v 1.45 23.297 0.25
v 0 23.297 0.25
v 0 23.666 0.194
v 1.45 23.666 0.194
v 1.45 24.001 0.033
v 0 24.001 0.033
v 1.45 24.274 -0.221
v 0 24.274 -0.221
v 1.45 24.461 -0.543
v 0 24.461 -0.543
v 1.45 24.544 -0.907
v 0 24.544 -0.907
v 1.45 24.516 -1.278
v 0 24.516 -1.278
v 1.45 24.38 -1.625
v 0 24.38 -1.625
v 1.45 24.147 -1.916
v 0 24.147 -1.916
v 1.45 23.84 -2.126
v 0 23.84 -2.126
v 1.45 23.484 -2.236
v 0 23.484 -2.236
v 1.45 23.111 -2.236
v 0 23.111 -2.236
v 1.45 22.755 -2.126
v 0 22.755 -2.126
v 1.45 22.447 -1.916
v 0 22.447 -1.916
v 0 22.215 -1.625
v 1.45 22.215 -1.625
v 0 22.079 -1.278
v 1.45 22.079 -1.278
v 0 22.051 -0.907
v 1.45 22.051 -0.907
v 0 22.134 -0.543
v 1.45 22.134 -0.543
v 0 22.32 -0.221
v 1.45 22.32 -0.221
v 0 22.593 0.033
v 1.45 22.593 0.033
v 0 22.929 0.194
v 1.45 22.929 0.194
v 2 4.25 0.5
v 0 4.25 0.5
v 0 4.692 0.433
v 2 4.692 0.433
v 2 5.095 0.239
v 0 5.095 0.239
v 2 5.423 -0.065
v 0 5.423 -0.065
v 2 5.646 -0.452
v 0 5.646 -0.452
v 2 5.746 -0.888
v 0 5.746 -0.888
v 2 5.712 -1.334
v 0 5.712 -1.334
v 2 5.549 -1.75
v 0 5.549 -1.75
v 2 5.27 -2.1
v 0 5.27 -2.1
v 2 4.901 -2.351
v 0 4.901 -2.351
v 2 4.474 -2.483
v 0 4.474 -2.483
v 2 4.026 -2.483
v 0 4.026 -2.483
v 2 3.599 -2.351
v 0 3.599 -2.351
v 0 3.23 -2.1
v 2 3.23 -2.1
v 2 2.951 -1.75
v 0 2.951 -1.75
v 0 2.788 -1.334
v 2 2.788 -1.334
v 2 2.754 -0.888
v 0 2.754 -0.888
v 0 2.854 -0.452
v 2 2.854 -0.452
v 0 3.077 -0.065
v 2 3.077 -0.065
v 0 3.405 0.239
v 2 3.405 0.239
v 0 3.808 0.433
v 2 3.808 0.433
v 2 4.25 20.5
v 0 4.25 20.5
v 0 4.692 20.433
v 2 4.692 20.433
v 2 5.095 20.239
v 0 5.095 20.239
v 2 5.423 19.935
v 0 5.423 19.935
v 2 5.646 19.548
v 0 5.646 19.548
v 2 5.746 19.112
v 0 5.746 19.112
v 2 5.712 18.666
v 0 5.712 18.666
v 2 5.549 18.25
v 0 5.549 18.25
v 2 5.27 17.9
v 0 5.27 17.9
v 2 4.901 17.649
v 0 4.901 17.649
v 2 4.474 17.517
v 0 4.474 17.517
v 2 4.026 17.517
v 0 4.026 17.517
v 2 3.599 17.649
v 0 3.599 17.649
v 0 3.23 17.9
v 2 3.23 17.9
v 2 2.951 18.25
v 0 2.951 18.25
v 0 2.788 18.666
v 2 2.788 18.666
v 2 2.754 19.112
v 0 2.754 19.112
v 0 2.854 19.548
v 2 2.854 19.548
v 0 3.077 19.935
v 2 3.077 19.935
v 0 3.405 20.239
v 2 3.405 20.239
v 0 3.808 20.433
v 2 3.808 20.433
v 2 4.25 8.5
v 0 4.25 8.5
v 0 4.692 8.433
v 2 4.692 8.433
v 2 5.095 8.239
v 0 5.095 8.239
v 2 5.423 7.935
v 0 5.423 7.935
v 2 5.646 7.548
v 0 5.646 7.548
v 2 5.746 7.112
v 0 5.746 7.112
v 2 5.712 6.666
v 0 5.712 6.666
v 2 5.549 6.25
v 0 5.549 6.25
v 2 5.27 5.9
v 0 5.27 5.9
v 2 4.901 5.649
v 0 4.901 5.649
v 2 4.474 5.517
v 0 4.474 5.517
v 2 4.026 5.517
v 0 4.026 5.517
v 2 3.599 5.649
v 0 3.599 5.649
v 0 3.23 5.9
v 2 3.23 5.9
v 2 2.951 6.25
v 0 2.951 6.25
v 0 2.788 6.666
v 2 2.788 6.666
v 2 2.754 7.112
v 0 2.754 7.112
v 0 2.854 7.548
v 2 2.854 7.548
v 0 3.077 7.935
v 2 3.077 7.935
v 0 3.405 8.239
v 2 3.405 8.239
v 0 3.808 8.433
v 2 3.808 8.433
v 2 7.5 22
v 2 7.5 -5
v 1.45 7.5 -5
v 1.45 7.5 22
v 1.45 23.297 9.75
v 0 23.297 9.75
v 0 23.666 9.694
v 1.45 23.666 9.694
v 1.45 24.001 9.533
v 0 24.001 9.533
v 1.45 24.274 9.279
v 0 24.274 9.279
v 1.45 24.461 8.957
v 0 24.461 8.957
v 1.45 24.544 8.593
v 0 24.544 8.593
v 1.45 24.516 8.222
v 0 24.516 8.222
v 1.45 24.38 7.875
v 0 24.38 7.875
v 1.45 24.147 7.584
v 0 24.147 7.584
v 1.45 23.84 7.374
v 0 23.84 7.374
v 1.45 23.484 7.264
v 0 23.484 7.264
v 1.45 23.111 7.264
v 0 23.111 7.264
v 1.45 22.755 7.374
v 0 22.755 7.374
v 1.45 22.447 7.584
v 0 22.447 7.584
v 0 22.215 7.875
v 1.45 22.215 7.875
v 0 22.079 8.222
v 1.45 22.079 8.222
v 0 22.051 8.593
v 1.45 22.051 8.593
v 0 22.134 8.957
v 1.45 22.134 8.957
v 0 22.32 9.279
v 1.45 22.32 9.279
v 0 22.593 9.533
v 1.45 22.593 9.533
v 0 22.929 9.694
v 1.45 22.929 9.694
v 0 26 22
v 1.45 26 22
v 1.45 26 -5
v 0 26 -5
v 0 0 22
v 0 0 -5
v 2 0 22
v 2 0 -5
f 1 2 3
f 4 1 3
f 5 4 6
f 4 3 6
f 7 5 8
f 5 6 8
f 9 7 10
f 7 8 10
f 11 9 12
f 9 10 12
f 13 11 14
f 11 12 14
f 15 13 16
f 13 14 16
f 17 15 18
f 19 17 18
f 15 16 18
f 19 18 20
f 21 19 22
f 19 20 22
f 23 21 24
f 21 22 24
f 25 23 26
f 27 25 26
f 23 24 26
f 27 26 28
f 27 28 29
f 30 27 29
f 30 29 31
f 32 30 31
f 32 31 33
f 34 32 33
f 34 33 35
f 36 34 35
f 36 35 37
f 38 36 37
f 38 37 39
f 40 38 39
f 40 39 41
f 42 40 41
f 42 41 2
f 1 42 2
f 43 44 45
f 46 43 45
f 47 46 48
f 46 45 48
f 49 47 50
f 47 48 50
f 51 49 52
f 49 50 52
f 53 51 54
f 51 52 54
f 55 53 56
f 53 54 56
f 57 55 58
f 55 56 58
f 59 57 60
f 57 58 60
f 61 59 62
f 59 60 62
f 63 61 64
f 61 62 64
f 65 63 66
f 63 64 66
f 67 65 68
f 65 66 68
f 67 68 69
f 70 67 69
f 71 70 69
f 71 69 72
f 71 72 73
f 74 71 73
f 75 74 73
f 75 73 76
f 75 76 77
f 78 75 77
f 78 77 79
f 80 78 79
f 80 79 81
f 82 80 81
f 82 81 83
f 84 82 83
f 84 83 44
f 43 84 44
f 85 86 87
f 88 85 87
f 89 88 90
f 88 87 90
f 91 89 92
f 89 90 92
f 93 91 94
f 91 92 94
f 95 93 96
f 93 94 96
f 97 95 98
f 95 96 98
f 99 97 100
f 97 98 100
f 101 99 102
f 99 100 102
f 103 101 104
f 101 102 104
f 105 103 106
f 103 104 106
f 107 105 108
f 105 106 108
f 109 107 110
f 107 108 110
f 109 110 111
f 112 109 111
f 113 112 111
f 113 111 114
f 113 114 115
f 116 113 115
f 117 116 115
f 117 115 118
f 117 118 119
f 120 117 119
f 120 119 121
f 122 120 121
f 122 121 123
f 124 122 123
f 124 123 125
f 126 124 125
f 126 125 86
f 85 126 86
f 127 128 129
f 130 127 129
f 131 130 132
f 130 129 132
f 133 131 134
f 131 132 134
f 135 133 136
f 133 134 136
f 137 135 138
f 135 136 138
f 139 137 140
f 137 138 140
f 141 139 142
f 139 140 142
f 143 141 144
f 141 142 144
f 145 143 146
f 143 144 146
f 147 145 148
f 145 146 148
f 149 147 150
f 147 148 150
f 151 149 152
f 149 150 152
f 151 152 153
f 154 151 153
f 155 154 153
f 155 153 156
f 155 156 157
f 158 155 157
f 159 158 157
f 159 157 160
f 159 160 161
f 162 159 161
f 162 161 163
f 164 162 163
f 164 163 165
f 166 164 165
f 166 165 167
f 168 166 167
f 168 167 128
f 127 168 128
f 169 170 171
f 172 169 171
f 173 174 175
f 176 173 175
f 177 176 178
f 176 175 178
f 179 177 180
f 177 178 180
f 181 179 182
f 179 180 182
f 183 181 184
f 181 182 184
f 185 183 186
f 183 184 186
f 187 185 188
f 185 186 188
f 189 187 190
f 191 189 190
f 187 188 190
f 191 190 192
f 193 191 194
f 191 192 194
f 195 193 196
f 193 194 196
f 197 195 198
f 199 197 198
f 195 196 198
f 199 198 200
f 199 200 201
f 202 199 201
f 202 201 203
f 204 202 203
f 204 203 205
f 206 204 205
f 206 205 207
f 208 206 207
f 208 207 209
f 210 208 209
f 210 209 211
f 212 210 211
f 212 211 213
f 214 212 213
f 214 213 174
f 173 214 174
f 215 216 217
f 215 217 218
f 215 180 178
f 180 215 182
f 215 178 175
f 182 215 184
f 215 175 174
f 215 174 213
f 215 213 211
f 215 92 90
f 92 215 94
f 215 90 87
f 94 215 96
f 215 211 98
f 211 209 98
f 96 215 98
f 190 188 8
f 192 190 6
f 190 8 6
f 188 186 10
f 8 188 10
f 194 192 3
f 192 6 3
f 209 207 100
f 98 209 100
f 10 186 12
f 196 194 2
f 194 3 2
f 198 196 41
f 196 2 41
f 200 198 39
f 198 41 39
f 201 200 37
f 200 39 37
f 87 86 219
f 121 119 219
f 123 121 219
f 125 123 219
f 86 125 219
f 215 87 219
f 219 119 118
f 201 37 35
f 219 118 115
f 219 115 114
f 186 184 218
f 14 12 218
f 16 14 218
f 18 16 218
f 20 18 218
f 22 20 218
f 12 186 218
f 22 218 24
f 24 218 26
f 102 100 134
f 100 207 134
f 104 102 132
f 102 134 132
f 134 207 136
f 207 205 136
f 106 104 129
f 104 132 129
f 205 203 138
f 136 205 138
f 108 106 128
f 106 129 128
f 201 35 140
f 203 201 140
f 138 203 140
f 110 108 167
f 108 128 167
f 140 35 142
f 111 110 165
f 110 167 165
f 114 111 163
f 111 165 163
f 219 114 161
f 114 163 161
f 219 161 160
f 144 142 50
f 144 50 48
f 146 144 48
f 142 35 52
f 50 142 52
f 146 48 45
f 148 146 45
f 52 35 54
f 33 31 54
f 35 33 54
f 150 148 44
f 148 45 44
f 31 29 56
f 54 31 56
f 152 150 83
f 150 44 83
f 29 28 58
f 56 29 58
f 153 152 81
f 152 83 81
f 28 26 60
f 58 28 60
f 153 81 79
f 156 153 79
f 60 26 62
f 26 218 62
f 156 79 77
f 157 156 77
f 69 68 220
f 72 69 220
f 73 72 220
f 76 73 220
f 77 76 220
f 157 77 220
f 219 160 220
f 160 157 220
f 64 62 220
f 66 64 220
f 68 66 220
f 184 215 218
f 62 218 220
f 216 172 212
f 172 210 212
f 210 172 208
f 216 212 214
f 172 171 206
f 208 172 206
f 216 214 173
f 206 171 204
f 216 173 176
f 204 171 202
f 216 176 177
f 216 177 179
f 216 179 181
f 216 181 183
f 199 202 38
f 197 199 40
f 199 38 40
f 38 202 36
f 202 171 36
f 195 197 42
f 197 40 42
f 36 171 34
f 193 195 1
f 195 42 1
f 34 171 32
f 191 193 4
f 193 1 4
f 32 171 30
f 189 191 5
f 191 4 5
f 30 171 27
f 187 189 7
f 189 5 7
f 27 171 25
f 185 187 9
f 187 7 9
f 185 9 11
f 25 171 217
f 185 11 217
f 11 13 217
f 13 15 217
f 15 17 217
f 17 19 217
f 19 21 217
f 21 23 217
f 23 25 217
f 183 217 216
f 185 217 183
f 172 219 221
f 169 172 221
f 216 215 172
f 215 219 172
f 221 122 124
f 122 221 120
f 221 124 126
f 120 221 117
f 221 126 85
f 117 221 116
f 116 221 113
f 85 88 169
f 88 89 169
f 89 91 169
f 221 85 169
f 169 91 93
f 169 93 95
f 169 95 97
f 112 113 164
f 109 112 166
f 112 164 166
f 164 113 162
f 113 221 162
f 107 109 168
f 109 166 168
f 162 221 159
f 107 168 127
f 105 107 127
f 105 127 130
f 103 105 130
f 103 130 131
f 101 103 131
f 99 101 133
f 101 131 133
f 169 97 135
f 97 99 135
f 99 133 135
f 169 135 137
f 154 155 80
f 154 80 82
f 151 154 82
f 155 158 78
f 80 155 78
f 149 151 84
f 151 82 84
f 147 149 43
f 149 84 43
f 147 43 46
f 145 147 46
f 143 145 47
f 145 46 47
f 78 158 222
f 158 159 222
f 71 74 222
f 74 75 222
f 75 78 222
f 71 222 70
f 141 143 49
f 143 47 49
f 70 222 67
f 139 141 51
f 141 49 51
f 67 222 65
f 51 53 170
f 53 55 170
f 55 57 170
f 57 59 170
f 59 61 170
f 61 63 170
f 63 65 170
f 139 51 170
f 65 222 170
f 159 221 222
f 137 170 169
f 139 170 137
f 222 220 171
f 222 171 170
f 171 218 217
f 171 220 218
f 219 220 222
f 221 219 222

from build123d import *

# Parameters (mm, degrees)
BOSS_EXTRUDE1_DEPTH            = 22
BOSS_EXTRUDE1_DEPTH_BACK       = 5
TAP_DRILL_FOR_M3X0_5_TAP1_D    = 3
TAP_DRILL_FOR_M2_5X0_45_TAP1_D = 2.5


with BuildPart() as part:
    # Sketch1 → Boss-Extrude1 (new, two sides: drawn at the far end of the back side and taken through both)
    with BuildSketch(Plane.XY.offset(-BOSS_EXTRUDE1_DEPTH_BACK)):
        Polygon((0, 0), (2, 0), (2, 7.5), (1.45, 7.5), (1.45, 26), (0, 26), (0, 7.5), align=None)
    extrude(amount=BOSS_EXTRUDE1_DEPTH + BOSS_EXTRUDE1_DEPTH_BACK)

    # Tap Drill for M3x0.5 Tap1 (through all)
    with Locations(Plane(origin=(2, 0, 0), x_dir=(0, 0, -1), z_dir=(1, 0, 0))):
        with Locations((-7, 4.25), (-19, 4.25), (1, 4.25)):
            Hole(TAP_DRILL_FOR_M3X0_5_TAP1_D / 2)

    # Tap Drill for M2.5x0.45 Tap1 (through all)
    with Locations(Plane(origin=(1.45, 0, 0), x_dir=(0, 0, -1), z_dir=(1, 0, 0))):
        with Locations((1, 23.297203827), (-8.5, 23.297203827)):
            Hole(TAP_DRILL_FOR_M2_5X0_45_TAP1_D / 2)


solid = part.part
